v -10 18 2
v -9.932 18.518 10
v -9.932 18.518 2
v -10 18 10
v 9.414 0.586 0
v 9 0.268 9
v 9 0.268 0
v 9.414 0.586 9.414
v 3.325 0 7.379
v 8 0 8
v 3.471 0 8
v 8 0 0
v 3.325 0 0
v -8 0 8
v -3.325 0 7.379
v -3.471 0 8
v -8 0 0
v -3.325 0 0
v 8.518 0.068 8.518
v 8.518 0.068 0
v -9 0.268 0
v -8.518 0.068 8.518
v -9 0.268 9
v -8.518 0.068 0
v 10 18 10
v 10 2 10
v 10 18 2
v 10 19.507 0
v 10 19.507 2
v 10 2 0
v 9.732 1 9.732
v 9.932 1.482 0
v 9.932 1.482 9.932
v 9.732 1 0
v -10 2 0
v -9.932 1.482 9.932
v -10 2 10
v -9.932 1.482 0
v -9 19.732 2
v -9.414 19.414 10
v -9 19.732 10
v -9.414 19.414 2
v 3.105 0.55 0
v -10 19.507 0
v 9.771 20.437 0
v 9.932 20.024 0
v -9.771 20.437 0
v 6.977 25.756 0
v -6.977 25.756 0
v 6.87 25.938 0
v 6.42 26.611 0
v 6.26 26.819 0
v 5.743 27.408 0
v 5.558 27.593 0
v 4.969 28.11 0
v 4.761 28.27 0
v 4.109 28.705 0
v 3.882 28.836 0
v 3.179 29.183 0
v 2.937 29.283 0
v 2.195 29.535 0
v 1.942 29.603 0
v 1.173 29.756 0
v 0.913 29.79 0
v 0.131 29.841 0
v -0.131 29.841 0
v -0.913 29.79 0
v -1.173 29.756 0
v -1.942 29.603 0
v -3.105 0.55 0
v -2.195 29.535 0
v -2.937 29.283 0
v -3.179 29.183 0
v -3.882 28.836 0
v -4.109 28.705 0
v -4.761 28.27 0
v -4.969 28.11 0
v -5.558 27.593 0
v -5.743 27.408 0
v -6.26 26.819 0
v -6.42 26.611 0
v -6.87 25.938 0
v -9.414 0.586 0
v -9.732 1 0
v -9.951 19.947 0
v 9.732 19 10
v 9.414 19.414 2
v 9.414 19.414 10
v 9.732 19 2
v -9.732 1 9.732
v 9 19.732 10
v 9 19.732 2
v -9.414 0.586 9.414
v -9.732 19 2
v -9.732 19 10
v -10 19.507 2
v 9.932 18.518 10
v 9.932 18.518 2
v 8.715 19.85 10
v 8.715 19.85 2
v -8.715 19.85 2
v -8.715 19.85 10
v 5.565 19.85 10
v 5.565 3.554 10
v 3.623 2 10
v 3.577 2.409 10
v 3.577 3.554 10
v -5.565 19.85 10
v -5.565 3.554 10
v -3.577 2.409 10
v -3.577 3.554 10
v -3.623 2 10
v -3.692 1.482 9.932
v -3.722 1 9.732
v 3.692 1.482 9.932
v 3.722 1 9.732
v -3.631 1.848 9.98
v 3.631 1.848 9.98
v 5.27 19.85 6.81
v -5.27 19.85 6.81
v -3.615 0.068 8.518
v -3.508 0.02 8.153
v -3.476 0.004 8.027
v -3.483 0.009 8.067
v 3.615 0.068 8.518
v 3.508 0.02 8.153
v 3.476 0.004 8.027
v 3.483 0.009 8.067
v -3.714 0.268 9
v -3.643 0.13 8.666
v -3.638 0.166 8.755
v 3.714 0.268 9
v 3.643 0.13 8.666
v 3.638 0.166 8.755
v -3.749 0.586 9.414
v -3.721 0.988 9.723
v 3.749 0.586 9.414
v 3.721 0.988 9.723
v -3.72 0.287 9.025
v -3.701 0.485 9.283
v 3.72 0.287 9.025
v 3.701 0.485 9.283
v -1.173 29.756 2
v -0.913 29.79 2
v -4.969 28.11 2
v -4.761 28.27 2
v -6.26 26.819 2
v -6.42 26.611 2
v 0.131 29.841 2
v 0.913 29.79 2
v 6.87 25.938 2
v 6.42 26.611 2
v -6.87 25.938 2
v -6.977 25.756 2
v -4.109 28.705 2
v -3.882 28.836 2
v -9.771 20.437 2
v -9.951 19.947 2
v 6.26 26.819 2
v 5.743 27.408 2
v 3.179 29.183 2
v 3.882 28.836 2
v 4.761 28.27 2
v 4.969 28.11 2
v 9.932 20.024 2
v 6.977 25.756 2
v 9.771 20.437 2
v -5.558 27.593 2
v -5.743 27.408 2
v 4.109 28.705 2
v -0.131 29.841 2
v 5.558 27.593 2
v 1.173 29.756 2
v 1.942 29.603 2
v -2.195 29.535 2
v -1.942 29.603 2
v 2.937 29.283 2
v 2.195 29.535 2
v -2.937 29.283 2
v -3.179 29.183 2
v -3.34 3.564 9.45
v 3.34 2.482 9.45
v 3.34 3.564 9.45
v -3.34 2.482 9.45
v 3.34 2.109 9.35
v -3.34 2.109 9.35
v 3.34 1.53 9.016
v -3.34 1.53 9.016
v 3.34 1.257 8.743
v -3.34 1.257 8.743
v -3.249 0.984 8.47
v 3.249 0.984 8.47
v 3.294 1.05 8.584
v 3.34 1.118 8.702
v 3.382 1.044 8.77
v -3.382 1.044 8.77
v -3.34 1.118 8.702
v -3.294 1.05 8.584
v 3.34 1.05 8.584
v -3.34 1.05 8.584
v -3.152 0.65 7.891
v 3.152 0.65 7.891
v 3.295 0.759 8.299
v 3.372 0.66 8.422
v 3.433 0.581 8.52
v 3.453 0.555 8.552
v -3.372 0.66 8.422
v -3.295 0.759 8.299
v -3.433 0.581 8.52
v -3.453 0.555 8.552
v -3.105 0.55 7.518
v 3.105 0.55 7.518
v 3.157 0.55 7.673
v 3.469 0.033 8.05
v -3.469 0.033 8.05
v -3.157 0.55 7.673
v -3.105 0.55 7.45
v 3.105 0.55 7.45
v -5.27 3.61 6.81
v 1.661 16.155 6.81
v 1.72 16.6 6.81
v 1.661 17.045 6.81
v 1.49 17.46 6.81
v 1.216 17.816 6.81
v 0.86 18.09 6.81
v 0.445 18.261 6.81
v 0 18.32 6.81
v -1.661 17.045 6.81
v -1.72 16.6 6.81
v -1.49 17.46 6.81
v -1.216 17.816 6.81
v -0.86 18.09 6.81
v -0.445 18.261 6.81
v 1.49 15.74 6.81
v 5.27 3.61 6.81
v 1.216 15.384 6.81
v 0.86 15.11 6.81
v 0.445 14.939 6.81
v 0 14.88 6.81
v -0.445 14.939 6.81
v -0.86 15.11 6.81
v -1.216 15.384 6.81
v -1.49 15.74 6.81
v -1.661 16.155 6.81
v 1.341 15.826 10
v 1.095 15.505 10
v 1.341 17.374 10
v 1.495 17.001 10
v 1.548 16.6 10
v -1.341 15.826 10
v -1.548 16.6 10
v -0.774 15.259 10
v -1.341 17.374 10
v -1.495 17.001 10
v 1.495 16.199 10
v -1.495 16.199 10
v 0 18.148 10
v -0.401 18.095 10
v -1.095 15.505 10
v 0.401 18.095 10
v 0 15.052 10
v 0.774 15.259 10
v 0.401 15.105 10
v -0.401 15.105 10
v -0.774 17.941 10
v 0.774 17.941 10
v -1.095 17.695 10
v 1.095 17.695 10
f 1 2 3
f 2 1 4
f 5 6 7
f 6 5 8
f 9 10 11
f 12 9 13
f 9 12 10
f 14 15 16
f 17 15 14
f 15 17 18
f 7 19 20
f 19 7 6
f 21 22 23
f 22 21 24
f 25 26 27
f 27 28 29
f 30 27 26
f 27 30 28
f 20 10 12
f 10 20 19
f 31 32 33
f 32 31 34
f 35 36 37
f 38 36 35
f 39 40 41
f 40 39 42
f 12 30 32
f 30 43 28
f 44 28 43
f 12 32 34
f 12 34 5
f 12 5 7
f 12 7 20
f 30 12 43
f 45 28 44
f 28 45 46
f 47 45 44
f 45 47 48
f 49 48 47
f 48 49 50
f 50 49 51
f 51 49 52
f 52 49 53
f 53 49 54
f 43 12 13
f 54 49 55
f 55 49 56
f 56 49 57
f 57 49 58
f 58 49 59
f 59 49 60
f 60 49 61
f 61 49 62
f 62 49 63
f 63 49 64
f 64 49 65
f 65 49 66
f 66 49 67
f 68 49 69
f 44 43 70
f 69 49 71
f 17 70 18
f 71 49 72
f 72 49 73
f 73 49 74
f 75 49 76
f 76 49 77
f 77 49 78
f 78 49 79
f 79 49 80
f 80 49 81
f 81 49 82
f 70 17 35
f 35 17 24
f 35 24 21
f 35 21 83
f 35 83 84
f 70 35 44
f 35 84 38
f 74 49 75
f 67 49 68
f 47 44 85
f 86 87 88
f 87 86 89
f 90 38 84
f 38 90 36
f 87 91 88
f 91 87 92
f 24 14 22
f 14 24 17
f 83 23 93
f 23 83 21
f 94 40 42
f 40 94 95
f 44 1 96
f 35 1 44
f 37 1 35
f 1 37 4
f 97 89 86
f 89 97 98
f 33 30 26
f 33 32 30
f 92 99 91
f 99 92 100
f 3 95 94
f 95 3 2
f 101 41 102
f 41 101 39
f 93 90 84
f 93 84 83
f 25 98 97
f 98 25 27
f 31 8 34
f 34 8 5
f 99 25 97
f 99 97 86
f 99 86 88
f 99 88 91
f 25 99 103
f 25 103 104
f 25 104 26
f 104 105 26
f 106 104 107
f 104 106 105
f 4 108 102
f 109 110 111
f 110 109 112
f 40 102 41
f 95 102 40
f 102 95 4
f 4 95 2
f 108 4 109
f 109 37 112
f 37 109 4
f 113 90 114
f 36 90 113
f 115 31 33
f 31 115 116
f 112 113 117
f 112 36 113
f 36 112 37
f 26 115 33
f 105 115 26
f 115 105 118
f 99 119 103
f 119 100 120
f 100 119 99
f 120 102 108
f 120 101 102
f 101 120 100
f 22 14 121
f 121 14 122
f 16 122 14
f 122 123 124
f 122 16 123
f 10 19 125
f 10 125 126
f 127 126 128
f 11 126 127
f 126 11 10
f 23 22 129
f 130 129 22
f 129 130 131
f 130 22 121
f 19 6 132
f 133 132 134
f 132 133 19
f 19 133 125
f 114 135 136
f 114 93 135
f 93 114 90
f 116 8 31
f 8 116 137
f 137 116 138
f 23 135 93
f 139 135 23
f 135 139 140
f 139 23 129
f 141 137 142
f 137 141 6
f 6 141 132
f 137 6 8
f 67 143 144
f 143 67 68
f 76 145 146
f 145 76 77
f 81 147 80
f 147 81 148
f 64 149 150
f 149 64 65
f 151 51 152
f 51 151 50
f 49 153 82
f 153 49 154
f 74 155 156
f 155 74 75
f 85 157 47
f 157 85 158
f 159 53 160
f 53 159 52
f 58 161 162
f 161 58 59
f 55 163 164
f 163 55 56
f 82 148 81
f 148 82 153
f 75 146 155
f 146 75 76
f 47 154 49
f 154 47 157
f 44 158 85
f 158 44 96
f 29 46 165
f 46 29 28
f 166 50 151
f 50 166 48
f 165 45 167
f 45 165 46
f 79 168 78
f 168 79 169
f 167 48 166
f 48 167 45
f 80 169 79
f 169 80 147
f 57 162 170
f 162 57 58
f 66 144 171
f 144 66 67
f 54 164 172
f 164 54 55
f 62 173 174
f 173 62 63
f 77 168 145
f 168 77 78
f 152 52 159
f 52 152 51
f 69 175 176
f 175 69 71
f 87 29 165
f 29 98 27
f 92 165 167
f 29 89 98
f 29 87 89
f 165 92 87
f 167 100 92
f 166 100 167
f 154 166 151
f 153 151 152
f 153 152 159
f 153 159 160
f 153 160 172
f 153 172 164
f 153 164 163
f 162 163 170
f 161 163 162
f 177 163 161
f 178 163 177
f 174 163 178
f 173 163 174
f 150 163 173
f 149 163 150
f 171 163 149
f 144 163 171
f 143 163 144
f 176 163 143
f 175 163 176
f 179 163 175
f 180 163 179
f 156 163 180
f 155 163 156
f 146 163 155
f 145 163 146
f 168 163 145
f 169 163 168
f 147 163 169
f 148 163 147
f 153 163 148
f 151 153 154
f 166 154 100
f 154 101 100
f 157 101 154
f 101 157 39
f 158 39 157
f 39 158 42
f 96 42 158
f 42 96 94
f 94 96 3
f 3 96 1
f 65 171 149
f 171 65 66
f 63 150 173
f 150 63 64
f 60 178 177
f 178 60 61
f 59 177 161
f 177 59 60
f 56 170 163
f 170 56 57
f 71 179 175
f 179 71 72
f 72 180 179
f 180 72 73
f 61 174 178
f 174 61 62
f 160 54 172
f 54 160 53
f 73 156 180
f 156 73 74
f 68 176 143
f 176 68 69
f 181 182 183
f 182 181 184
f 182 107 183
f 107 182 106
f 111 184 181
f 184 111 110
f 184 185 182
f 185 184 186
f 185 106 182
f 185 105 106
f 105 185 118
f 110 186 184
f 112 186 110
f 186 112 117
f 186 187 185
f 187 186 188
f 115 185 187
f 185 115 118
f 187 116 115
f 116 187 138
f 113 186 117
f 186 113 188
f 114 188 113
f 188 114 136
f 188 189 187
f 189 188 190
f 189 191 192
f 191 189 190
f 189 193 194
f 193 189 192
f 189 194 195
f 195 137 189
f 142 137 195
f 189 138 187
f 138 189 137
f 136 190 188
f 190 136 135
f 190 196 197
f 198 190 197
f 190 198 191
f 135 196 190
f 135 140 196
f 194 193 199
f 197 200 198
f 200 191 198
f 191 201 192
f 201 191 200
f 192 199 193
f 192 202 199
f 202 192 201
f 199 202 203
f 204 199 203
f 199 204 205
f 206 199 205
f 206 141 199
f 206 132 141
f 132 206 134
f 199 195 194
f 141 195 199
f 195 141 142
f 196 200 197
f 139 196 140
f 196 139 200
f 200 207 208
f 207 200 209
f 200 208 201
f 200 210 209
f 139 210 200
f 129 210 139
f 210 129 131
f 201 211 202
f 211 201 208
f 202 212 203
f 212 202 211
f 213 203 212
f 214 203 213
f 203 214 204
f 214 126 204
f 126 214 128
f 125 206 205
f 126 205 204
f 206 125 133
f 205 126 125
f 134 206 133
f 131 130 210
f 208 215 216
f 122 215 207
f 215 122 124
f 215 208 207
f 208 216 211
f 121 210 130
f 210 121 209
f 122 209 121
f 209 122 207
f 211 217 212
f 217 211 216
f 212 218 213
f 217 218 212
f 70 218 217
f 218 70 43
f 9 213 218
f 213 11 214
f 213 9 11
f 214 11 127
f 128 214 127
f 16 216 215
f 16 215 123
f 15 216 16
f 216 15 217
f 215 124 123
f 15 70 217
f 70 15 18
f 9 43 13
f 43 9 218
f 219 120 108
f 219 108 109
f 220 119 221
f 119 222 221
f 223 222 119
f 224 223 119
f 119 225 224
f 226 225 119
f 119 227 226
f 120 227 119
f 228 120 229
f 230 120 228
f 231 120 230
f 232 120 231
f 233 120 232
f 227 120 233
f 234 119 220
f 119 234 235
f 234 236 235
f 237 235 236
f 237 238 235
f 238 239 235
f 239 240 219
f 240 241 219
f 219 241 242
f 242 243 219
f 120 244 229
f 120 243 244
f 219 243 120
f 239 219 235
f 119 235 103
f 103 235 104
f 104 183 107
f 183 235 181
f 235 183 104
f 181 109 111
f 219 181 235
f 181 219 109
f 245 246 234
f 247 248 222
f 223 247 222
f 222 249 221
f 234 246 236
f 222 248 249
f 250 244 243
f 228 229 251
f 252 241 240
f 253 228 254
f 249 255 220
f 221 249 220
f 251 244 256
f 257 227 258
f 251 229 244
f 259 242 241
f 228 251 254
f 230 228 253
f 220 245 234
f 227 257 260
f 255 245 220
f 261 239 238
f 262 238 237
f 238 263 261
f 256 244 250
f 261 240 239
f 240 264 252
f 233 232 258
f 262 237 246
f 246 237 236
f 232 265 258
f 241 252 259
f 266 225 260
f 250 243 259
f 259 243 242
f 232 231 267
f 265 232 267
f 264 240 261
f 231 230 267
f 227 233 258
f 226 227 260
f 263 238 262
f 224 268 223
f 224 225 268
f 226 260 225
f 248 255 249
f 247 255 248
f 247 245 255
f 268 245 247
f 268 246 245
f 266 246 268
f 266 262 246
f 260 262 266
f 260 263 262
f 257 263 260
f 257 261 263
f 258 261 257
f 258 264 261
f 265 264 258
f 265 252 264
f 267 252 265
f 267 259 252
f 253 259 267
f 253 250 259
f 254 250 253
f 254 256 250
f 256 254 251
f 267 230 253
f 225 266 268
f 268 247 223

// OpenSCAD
// Pin Bender for TO-220AB MOSFET to lie horizontally on board.

module TO_220AB_bender() {
    body_l      = 15.24;  // including tab
    body_w      = 10.54;
    body_th     = 4.69;

    hole_offset = 16.6;  // from center of bent pins to center of tab hole
    hole_d      = 3.54;

    pin_l       = 14.09;
    pin_upper_w = 1.40;
    pin_upper_l = 4.06;
    pin_lower_w = 0.93;
    pin_th      = 0.55;
    pin_spacing = 2.54;
    pin_offset  = 2.64;

    bend_r = 2;  // bend radius for leads

    tool_w = max(body_w + 6, 20);
    tool_l = body_l + pin_upper_l + pin_th;
    tool_th = 10;
    tool_r = 2;  // rounding of corners
    grip_l = 8;
    grip_th = 2;

    post_th = pin_offset + pin_th;
    post_d = hole_d - 0.1;

    module tool() {
        intersection() {
            linear_extrude(tool_th, convexity=8) {
                translate([-tool_w/2, 0]) {
                    offset(r=tool_r, $fn=24) offset(delta=-tool_r)
                        square(tool_w, tool_l);
                }
            }
            
            rotate([0, 90, 0]) linear_extrude(tool_w+1, center=true) {
                hull() {
                    translate([-tool_th+bend_r, bend_r]) circle(r=bend_r, $fn=24);
                    translate([-1, 0]) square(1);
                    translate([-1, tool_l-1]) square(1);
                    translate([-tool_th, tool_l-1]) square(1);
                }
            }
        }

        linear_extrude(grip_th, convexity=8) {
            offset(r=tool_r, $fn=24) offset(delta=-tool_r) hull() {
                translate([-tool_w/2, 0]) square(tool_w, tool_l);
                translate([0, tool_l+grip_l/4]) circle(r=grip_l, $fn=48);
            }
        }
    }

    module cavity() {
        translate([0, pin_upper_l, -pin_offset]) {
            linear_extrude(body_th+1, scale=1.1, convexity=8) {
                translate([-body_w/2, -1]) square([body_w, body_l+1]);
            }
        }
    }
    
    module post() {
        linear_extrude(post_th, scale=0.9) circle(d=post_d, $fn=24);
    }
    
    module channel() {
        channel_w1 = 2*pin_spacing + pin_upper_w + 0.2;
        channel_w2 = 2*pin_spacing + pin_lower_w + 0.2;
        linear_extrude(pin_th + 1, scale=1.2) {
            translate([0, pin_upper_l]) {
                polygon([
                    [-channel_w1/2, 0],
                    [-channel_w1/2, -pin_upper_l],
                    [-channel_w2/2, -pin_upper_l-1],
                    [-channel_w2/2, -pin_l],
                    [ channel_w2/2, -pin_l],
                    [ channel_w2/2, -pin_upper_l-1],
                    [ channel_w1/2, -pin_upper_l],
                    [ channel_w1/2, 0]            
                 ]);
            }
        }
    }

    difference() {
        tool();
        translate([0, pin_th, tool_th-pin_th]) {
            cavity();
            for (theta = [0:15:90]) {
                s = sin(theta)*(bend_r/2);
                c = cos(theta)*(bend_r/2);
                translate([0, c, -s]) rotate([theta, 0, 0]) channel();
            }
        }
    }

    translate([0, hole_offset, tool_th-post_th]) post();
}

TO_220AB_bender();
